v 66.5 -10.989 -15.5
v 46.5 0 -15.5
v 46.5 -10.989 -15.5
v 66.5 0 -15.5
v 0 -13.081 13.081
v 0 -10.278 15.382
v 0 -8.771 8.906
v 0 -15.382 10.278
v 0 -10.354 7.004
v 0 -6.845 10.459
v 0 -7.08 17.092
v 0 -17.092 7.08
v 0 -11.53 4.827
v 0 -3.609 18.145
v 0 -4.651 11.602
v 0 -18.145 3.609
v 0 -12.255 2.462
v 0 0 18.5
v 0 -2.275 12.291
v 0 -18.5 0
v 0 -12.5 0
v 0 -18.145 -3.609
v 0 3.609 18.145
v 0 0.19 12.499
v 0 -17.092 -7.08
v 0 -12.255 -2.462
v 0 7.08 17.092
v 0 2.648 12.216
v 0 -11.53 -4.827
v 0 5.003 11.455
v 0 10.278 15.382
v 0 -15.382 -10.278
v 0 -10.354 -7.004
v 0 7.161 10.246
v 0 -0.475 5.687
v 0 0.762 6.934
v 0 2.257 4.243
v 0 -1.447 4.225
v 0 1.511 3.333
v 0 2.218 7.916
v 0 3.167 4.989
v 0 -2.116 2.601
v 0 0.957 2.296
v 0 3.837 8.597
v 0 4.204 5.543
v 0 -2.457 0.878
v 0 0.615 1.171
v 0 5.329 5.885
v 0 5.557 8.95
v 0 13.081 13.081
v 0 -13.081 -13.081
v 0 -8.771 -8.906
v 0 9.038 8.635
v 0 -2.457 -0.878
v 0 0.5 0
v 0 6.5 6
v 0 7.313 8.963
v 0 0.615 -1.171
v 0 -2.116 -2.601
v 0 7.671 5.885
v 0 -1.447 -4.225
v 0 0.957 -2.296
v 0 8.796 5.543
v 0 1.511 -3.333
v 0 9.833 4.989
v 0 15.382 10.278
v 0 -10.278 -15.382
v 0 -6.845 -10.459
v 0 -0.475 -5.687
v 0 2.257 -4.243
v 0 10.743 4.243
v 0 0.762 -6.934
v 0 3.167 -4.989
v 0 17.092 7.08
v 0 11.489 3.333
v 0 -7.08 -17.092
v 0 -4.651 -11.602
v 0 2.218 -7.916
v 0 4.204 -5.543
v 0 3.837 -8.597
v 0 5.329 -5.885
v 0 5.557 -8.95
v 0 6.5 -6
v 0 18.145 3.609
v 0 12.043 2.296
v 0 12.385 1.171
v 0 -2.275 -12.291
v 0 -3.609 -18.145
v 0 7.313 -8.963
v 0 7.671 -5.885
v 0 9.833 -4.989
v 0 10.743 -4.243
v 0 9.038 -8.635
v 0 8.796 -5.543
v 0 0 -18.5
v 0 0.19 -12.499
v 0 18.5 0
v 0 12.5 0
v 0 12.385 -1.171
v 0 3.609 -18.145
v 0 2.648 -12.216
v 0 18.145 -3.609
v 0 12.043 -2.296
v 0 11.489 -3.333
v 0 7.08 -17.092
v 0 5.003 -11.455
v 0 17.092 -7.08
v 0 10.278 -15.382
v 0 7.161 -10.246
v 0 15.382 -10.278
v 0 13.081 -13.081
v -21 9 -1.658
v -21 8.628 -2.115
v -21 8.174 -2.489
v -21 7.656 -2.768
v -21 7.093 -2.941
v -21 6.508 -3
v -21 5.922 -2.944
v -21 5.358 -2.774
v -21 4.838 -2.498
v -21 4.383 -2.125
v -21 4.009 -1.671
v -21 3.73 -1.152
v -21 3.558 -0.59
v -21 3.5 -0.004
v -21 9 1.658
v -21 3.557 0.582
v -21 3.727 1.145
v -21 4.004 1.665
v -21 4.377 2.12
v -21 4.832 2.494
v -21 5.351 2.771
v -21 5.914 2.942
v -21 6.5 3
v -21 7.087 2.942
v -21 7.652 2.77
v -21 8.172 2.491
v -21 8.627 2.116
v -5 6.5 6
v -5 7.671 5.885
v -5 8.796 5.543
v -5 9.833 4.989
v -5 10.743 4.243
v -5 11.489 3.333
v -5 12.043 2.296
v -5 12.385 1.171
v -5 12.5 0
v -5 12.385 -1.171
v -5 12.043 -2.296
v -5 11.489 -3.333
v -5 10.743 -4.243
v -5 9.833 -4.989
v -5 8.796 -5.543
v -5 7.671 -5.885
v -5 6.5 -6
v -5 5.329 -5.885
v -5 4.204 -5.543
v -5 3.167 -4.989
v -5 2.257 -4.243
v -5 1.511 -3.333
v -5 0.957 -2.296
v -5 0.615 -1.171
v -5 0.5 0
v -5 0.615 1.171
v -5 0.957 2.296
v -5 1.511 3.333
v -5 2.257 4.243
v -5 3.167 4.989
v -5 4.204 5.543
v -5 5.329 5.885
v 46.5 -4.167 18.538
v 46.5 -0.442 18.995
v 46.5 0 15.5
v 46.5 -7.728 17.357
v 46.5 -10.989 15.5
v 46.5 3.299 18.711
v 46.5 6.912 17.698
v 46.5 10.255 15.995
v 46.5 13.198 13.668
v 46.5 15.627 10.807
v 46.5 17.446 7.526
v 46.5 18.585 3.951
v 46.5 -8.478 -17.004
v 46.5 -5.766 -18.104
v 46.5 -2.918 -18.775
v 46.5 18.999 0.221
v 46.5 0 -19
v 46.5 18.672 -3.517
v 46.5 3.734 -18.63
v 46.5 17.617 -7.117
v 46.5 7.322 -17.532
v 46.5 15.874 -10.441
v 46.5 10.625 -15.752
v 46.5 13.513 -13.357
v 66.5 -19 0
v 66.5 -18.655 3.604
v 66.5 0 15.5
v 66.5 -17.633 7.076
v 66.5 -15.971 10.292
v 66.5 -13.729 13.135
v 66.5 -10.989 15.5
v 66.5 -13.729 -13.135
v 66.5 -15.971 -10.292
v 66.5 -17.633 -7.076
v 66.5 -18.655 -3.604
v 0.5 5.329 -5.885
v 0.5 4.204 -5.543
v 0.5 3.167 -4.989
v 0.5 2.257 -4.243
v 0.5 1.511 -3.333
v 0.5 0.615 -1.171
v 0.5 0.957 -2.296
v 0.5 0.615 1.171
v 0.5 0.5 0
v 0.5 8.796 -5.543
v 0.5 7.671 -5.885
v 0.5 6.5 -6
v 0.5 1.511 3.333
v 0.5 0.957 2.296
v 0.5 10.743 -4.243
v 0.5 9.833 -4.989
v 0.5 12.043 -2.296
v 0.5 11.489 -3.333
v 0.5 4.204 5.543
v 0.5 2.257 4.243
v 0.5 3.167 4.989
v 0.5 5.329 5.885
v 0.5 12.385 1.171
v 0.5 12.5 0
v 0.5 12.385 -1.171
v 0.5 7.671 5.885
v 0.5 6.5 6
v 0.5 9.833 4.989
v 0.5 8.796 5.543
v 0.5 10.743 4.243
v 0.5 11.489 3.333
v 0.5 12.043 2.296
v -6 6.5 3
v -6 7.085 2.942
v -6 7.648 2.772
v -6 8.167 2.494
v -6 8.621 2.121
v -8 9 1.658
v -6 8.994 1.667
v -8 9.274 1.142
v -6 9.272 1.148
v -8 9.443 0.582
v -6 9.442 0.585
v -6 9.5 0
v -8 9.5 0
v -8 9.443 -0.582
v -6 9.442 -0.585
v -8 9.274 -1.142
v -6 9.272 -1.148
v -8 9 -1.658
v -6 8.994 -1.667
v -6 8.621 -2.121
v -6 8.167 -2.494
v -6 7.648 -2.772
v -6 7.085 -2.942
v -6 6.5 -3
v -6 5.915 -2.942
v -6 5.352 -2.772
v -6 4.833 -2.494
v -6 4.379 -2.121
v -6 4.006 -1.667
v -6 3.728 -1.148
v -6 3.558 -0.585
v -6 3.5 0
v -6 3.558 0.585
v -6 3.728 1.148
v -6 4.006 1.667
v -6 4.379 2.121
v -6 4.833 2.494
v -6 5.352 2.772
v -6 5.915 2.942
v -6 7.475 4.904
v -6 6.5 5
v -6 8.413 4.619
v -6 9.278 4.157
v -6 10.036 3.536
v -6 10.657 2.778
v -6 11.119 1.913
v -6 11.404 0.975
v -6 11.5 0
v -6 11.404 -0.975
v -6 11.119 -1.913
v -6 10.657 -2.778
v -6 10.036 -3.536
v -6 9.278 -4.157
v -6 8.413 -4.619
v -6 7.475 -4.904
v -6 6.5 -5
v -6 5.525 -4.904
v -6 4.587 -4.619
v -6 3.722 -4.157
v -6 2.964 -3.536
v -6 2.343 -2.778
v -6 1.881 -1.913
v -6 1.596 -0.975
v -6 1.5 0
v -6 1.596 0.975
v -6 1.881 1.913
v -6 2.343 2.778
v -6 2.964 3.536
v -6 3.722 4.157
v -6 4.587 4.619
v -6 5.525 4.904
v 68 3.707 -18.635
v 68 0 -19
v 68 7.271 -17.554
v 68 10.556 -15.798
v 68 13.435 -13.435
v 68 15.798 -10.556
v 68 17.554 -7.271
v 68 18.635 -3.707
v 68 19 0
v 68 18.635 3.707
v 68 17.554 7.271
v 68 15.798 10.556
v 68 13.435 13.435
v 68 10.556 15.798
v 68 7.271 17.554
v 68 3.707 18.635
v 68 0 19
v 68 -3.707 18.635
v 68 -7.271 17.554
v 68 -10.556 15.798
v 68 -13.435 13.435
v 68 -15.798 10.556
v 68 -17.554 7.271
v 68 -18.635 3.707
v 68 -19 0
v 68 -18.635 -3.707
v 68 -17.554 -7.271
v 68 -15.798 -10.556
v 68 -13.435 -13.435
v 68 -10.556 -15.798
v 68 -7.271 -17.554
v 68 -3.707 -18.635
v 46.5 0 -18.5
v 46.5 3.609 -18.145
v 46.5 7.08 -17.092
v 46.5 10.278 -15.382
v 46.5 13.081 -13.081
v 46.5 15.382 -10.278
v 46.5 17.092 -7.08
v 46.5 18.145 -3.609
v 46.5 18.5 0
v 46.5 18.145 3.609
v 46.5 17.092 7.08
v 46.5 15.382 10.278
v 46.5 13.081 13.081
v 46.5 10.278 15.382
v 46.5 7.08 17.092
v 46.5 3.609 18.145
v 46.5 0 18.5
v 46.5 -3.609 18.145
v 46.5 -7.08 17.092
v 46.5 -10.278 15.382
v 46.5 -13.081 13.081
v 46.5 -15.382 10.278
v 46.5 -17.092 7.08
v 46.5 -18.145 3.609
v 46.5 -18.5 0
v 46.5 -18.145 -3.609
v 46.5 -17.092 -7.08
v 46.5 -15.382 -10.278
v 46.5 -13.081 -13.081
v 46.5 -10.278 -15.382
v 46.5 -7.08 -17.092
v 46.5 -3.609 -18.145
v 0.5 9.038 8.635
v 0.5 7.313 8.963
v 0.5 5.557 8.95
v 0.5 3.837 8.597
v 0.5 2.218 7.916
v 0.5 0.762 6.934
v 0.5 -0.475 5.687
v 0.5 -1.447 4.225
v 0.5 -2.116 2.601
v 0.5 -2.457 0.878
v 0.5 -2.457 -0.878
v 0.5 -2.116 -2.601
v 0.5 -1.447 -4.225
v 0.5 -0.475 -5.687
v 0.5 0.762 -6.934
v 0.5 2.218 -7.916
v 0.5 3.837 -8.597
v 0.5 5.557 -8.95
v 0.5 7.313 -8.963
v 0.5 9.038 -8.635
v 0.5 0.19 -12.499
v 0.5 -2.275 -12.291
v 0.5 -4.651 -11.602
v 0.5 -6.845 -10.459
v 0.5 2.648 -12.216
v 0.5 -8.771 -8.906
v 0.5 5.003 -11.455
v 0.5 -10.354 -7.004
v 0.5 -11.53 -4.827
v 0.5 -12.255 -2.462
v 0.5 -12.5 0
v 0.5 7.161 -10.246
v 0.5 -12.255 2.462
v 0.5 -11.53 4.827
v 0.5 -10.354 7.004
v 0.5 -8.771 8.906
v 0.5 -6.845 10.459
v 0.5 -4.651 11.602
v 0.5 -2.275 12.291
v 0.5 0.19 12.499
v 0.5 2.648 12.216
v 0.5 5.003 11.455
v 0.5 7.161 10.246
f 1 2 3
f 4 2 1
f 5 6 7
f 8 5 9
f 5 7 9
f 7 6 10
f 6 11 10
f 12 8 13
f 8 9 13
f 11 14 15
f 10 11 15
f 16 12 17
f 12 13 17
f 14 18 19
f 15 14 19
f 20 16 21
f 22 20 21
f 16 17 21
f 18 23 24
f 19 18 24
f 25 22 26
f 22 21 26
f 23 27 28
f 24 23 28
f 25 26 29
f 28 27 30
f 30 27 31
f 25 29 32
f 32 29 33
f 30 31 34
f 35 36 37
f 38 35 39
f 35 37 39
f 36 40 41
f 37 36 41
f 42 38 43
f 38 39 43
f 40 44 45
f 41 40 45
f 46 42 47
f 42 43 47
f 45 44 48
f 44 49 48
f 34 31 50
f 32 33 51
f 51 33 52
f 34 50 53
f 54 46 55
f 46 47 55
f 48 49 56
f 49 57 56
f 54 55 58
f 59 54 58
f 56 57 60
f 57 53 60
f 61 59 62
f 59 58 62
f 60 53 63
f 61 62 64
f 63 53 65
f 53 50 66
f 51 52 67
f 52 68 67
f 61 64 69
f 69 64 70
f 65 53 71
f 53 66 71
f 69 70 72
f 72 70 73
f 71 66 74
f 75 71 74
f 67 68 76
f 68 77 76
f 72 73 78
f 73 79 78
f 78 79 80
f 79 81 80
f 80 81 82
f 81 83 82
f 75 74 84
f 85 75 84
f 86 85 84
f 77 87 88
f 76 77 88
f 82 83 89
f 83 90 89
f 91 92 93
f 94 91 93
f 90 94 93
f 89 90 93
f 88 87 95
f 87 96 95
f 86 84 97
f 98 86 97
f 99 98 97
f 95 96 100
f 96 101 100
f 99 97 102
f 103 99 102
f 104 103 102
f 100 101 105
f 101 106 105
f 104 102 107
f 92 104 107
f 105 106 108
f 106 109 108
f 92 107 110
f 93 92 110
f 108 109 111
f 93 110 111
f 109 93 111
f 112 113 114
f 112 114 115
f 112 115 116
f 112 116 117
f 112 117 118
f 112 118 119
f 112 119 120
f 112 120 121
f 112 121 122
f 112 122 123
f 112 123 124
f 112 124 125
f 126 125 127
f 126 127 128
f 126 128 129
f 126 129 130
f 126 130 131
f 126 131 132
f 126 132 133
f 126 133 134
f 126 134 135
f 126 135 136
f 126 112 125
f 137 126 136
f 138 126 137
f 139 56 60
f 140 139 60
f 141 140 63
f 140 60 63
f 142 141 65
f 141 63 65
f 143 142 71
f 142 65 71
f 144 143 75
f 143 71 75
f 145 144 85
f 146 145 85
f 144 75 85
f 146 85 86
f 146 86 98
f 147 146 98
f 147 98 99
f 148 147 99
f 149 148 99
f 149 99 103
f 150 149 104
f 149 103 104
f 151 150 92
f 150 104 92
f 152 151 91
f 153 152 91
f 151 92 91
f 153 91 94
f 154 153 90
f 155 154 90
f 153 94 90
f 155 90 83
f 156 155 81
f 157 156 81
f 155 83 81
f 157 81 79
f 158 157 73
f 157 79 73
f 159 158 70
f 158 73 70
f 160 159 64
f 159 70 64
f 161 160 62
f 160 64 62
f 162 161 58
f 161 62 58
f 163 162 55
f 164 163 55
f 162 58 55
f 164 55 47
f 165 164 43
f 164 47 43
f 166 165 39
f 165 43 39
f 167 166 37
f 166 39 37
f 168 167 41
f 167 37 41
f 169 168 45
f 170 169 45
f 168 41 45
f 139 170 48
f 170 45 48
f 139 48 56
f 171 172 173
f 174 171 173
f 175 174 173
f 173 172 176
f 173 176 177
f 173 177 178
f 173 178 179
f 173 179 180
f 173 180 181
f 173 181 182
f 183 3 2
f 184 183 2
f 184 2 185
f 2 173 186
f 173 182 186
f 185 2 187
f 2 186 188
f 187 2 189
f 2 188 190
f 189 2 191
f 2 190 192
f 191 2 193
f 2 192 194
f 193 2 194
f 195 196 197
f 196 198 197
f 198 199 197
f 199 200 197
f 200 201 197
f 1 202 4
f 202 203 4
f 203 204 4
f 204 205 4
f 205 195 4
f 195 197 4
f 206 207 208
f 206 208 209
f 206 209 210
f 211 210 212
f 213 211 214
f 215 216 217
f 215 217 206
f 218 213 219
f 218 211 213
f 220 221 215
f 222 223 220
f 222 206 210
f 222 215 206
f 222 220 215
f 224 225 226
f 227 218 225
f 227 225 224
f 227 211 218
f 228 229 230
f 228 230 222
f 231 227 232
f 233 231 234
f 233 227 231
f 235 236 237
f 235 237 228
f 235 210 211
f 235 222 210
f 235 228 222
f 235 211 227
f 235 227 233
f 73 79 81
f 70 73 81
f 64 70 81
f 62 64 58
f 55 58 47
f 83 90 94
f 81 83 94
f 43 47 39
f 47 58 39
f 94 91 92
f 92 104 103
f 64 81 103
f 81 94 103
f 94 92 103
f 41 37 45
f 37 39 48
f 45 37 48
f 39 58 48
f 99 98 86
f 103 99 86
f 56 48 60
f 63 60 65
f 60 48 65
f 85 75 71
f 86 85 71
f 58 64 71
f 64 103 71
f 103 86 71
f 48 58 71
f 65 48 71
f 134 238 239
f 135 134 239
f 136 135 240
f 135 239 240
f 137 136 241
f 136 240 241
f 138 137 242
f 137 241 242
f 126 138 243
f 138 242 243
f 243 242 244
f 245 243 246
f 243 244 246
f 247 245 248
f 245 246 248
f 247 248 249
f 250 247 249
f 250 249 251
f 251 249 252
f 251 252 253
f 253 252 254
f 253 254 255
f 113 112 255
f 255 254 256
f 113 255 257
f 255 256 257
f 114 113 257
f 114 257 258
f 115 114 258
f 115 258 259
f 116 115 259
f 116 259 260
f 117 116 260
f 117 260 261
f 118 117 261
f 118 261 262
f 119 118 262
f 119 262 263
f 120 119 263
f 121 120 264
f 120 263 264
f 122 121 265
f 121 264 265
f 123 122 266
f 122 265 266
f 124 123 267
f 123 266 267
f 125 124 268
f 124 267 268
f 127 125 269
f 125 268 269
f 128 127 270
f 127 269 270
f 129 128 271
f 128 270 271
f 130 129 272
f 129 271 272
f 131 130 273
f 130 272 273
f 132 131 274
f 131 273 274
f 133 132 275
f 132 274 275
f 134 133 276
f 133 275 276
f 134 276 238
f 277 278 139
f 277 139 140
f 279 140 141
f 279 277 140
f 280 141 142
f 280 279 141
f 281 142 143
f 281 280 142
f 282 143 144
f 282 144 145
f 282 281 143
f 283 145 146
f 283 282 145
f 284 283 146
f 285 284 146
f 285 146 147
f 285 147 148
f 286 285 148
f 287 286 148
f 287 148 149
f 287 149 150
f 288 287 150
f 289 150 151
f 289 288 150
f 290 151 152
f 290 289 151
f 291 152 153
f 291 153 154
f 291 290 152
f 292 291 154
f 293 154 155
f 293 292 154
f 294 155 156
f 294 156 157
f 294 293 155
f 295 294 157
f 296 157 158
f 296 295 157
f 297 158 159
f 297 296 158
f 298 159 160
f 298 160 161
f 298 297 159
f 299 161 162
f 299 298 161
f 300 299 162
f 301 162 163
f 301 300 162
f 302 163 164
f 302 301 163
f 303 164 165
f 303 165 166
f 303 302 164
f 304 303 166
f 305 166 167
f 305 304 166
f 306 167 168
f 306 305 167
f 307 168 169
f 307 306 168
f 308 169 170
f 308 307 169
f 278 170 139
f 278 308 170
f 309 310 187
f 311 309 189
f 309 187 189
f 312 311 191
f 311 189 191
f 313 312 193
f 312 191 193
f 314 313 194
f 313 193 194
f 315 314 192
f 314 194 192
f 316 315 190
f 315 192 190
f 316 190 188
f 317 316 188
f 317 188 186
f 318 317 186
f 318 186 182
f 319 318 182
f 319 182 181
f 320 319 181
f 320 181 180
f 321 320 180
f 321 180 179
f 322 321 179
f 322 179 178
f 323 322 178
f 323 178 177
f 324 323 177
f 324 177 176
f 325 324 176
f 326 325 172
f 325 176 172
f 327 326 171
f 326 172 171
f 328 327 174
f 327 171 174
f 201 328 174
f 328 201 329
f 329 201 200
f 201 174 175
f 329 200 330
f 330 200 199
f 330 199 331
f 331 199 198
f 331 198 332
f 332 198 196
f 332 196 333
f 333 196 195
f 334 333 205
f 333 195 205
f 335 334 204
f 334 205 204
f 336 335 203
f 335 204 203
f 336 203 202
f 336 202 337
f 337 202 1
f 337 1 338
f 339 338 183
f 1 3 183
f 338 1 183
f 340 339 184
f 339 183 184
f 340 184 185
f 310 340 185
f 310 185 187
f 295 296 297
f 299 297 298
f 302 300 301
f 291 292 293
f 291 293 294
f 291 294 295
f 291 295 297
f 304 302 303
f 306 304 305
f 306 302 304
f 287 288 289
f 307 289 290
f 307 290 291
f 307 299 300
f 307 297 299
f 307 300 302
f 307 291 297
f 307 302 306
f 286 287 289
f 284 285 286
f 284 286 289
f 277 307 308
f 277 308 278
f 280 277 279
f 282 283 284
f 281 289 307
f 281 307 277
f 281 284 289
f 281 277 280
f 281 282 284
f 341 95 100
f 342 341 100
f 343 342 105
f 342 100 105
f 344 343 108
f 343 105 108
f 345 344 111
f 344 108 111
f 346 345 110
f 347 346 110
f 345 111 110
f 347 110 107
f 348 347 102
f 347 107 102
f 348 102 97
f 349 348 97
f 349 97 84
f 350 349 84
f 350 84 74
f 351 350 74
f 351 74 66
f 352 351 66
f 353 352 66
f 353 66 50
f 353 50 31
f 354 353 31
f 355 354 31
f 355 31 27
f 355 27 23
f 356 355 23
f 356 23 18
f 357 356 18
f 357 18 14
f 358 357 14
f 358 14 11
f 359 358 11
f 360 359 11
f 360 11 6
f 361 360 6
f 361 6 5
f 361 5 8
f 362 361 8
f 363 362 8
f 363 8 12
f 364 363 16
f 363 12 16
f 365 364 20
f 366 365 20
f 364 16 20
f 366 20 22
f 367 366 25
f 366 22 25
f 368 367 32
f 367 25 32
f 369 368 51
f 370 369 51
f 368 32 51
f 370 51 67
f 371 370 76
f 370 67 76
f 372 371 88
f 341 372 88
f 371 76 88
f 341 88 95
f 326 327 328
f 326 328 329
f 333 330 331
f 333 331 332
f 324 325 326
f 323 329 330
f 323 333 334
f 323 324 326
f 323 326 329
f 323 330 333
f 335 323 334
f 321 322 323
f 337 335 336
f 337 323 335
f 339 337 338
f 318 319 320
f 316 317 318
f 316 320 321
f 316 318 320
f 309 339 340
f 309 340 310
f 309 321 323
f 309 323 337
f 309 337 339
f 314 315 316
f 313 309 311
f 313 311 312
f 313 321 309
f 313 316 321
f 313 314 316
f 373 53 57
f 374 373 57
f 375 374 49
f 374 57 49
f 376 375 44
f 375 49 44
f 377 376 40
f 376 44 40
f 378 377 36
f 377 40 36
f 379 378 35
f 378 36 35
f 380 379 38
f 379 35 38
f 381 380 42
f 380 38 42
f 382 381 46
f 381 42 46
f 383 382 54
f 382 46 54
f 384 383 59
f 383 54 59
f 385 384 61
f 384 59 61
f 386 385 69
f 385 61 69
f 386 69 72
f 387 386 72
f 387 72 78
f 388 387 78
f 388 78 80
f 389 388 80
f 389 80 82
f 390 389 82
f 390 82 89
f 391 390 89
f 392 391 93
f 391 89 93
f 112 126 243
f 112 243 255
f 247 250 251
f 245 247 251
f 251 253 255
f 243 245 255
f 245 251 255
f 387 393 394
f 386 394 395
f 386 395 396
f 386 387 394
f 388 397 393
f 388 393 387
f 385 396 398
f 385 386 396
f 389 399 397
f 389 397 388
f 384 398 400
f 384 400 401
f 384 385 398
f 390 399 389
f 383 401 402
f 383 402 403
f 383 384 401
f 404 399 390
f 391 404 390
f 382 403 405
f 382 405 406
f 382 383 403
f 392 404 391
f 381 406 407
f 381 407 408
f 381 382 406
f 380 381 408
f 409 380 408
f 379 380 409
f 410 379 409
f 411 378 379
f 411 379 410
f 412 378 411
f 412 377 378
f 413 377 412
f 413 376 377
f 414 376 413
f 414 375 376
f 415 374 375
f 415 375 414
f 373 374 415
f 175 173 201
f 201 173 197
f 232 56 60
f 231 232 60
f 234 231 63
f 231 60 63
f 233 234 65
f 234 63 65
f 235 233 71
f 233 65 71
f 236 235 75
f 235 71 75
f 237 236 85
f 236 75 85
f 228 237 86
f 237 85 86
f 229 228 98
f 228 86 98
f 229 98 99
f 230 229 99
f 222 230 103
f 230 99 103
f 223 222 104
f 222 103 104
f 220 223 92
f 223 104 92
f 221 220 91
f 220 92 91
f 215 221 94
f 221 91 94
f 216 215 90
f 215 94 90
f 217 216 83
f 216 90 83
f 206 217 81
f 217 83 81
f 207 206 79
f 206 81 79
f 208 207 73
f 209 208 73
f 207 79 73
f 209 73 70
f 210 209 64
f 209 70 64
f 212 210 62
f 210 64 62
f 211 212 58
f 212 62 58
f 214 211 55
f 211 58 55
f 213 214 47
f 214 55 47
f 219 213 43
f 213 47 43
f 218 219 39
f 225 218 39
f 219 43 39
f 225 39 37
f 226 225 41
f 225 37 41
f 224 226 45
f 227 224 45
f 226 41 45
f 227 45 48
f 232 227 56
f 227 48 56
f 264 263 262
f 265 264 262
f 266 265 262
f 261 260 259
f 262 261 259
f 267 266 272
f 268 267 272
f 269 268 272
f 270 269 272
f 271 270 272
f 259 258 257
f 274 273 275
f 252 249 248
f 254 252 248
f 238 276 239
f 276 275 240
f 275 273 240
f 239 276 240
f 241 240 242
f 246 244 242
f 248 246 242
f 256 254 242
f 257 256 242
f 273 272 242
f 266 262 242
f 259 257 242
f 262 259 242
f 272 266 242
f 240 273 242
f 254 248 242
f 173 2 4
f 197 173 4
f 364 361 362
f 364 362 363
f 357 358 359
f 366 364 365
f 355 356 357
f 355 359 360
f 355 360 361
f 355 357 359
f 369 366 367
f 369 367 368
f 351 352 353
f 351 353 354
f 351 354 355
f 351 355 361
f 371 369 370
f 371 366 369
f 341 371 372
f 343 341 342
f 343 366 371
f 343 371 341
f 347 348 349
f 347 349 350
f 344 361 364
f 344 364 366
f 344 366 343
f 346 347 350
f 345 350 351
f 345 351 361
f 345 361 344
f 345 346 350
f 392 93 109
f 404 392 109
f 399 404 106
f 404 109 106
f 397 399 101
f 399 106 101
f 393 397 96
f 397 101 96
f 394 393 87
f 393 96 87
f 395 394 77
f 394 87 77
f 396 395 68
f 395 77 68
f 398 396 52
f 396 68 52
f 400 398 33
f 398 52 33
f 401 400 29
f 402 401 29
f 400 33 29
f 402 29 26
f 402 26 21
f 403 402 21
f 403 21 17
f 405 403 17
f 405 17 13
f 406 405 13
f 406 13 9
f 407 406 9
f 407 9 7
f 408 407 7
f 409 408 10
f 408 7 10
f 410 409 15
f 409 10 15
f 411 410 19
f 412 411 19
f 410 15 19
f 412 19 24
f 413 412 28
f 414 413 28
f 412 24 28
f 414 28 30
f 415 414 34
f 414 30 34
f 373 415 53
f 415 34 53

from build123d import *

# Parameters (mm, degrees)
SKETCH2_R           = 18.5
BOSS_EXTRUDE1_DEPTH = 50
SKETCH3_R           = 6
BOSS_EXTRUDE2_DEPTH = 6
SKETCH4_R           = 3
BOSS_EXTRUDE3_DEPTH = 15
CHAMFER1_SIZE       = 1
CUT_EXTRUDE1_DEPTH  = 13
SKETCH6_R           = 6
CUT_EXTRUDE2_DEPTH  = 0.5
CUT_EXTRUDE3_START  = -3.5
SKETCH7_R           = 18.5
CUT_EXTRUDE3_DEPTH  = 3.5
SKETCH8_R           = 19
BOSS_EXTRUDE4_DEPTH = 21.5
SKETCH9_W           = 20
SKETCH9_H           = 31
CUT_EXTRUDE4_DEPTH  = 21.5


with BuildPart() as part:
    # Sketch2 → Boss-Extrude1 (new body)
    with BuildSketch(Plane(origin=(0, 0, 0), x_dir=(0, 0, -1), z_dir=(1, 0, 0))):
        Circle(SKETCH2_R)
    extrude(amount=BOSS_EXTRUDE1_DEPTH)

    # Sketch6 → Cut-Extrude2 (cut)
    with BuildSketch(Plane.ZY):
        with Locations((0, 6.5)):
            Circle(SKETCH6_R)
        with BuildLine():
            ThreePointArc((-8.634593969, 9.038461538), (0, -12.5), (8.634593969, 9.038461538))
            ThreePointArc((8.634593969, 9.038461538), (0, -2.5), (-8.634593969, 9.038461538))
        make_face()
    extrude(amount=-CUT_EXTRUDE2_DEPTH, mode=Mode.SUBTRACT)

    # Sketch7 → Cut-Extrude3 (cut)
    with BuildSketch(Plane(origin=(50, 0, 0), x_dir=(0, 0, -1), z_dir=(1, 0, 0)).offset(CUT_EXTRUDE3_START)):
        Circle(SKETCH7_R)
    extrude(amount=CUT_EXTRUDE3_DEPTH, mode=Mode.SUBTRACT)


with BuildPart() as body_2:
    # Sketch3 → Boss-Extrude2 (new body)
    with BuildSketch(Plane.ZY):
        with Locations((0, 6.5)):
            Circle(SKETCH3_R)
    extrude(amount=BOSS_EXTRUDE2_DEPTH)

    # Chamfer1
    chamfer1_edges = [body_2.edges().sort_by_distance(p)[0] for p in [
        (-6, 6.5, -6),
    ]]
    chamfer(chamfer1_edges, length=CHAMFER1_SIZE)


with BuildPart() as body_3:
    # Sketch4 → Boss-Extrude3 (new body)
    with BuildSketch(Plane.ZY.offset(6)):
        with Locations((0, 6.5)):
            Circle(SKETCH4_R)
    extrude(amount=BOSS_EXTRUDE3_DEPTH)

    # Sketch5 → Cut-Extrude1 (cut)
    with BuildSketch(Plane.ZY.offset(21)):
        with BuildLine():
            Line((1.658312395, 9), (-1.658312395, 9))
            ThreePointArc((-1.658312395, 9), (0, 9.5), (1.658312395, 9))
        make_face()
    extrude(amount=-CUT_EXTRUDE1_DEPTH, mode=Mode.SUBTRACT)


with BuildPart() as body_4:
    # Sketch8 → Boss-Extrude4 (new body)
    with BuildSketch(Plane(origin=(46.5, 0, 0), x_dir=(0, 0, -1), z_dir=(1, 0, 0))):
        Circle(SKETCH8_R)
    extrude(amount=BOSS_EXTRUDE4_DEPTH)

    # Sketch9 → Cut-Extrude4 (cut)
    with BuildSketch(Plane(origin=(0, 0, 0), x_dir=(1, 0, 0), z_dir=(0, 1, 0))):
        with Locations((56.5, 0)):
            Rectangle(SKETCH9_W, SKETCH9_H)
    extrude(amount=-CUT_EXTRUDE4_DEPTH, mode=Mode.SUBTRACT)


solid = Compound([part.part, body_2.part, body_3.part, body_4.part])
